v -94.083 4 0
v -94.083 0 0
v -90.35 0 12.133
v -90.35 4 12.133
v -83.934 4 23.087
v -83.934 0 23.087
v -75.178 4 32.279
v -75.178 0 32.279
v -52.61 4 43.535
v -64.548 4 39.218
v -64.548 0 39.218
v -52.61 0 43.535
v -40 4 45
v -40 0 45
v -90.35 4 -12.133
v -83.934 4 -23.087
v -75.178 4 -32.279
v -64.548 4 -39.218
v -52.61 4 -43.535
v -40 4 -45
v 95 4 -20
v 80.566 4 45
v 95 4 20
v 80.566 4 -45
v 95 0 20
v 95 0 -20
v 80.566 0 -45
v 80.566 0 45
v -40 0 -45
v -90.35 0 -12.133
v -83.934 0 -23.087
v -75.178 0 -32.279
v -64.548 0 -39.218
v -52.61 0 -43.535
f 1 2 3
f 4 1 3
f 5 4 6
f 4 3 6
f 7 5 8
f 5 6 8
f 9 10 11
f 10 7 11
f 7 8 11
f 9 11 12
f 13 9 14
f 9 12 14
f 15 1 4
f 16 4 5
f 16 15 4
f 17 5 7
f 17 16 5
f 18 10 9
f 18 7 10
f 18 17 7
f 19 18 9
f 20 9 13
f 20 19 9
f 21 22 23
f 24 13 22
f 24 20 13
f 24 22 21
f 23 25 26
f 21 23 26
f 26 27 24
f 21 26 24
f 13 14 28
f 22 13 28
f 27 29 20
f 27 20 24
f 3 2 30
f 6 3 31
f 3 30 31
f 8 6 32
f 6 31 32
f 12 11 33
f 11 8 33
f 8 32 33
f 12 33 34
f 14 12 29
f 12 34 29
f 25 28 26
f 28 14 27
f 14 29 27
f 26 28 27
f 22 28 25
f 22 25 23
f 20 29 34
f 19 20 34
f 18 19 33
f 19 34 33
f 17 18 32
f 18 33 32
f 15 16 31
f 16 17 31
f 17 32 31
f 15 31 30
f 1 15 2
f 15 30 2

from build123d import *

# Parameters (mm, degrees)
ESQUISSE1_W        = 190
ESQUISSE1_H        = 90
BOSS_EXTRU_1_DEPTH = 4
CONG_1_R           = 55
CHANFREIN1_SIZE    = 25
CHANFREIN1_SIZE2   = 14.43375673


with BuildPart() as part:
    # Esquisse1 → Boss.-Extru.1 (new body)
    with BuildSketch(Plane(origin=(0, 0, 0), x_dir=(1, 0, 0), z_dir=(0, 1, 0))):
        Rectangle(ESQUISSE1_W, ESQUISSE1_H)
    extrude(amount=BOSS_EXTRU_1_DEPTH)

    # Congé1
    # the kernel refuses this fillet: 55 mm, written as the material it takes off along each edge
    with BuildSketch(Plane(origin=(-95, -137.5, 45), x_dir=(1, 0, 0), z_dir=(0, 1, 0))) as cong_1_piece_1:
        with BuildLine():
            CenterArc((CONG_1_R, CONG_1_R), CONG_1_R, 180, 90)
            Line((0, CONG_1_R), (0, 0))
            Line((0, 0), (CONG_1_R, 0))
        make_face()
    extrude(amount=279, mode=Mode.SUBTRACT)
    with BuildSketch(Plane(origin=(-95, -137.5, -45), x_dir=(1, 0, 0), z_dir=(0, 1, 0))) as cong_1_piece_2:
        with BuildLine():
            CenterArc((CONG_1_R, -CONG_1_R), CONG_1_R, 90, 90)
            Line((0, -CONG_1_R), (0, 0))
            Line((0, 0), (CONG_1_R, 0))
        make_face()
    extrude(amount=279, mode=Mode.SUBTRACT)

    # Chanfrein1
    chanfrein1_edges = [part.edges().sort_by_distance(p)[0] for p in [
        (95, 2, 45),
        (95, 2, -45),
    ]]
    chanfrein1_side = [part.faces().sort_by_distance(p)[0] for p in [
        (95, 2, 0),
    ]]
    chamfer(chanfrein1_edges, length=CHANFREIN1_SIZE, length2=CHANFREIN1_SIZE2, reference=chanfrein1_side[0])


solid = part.part
